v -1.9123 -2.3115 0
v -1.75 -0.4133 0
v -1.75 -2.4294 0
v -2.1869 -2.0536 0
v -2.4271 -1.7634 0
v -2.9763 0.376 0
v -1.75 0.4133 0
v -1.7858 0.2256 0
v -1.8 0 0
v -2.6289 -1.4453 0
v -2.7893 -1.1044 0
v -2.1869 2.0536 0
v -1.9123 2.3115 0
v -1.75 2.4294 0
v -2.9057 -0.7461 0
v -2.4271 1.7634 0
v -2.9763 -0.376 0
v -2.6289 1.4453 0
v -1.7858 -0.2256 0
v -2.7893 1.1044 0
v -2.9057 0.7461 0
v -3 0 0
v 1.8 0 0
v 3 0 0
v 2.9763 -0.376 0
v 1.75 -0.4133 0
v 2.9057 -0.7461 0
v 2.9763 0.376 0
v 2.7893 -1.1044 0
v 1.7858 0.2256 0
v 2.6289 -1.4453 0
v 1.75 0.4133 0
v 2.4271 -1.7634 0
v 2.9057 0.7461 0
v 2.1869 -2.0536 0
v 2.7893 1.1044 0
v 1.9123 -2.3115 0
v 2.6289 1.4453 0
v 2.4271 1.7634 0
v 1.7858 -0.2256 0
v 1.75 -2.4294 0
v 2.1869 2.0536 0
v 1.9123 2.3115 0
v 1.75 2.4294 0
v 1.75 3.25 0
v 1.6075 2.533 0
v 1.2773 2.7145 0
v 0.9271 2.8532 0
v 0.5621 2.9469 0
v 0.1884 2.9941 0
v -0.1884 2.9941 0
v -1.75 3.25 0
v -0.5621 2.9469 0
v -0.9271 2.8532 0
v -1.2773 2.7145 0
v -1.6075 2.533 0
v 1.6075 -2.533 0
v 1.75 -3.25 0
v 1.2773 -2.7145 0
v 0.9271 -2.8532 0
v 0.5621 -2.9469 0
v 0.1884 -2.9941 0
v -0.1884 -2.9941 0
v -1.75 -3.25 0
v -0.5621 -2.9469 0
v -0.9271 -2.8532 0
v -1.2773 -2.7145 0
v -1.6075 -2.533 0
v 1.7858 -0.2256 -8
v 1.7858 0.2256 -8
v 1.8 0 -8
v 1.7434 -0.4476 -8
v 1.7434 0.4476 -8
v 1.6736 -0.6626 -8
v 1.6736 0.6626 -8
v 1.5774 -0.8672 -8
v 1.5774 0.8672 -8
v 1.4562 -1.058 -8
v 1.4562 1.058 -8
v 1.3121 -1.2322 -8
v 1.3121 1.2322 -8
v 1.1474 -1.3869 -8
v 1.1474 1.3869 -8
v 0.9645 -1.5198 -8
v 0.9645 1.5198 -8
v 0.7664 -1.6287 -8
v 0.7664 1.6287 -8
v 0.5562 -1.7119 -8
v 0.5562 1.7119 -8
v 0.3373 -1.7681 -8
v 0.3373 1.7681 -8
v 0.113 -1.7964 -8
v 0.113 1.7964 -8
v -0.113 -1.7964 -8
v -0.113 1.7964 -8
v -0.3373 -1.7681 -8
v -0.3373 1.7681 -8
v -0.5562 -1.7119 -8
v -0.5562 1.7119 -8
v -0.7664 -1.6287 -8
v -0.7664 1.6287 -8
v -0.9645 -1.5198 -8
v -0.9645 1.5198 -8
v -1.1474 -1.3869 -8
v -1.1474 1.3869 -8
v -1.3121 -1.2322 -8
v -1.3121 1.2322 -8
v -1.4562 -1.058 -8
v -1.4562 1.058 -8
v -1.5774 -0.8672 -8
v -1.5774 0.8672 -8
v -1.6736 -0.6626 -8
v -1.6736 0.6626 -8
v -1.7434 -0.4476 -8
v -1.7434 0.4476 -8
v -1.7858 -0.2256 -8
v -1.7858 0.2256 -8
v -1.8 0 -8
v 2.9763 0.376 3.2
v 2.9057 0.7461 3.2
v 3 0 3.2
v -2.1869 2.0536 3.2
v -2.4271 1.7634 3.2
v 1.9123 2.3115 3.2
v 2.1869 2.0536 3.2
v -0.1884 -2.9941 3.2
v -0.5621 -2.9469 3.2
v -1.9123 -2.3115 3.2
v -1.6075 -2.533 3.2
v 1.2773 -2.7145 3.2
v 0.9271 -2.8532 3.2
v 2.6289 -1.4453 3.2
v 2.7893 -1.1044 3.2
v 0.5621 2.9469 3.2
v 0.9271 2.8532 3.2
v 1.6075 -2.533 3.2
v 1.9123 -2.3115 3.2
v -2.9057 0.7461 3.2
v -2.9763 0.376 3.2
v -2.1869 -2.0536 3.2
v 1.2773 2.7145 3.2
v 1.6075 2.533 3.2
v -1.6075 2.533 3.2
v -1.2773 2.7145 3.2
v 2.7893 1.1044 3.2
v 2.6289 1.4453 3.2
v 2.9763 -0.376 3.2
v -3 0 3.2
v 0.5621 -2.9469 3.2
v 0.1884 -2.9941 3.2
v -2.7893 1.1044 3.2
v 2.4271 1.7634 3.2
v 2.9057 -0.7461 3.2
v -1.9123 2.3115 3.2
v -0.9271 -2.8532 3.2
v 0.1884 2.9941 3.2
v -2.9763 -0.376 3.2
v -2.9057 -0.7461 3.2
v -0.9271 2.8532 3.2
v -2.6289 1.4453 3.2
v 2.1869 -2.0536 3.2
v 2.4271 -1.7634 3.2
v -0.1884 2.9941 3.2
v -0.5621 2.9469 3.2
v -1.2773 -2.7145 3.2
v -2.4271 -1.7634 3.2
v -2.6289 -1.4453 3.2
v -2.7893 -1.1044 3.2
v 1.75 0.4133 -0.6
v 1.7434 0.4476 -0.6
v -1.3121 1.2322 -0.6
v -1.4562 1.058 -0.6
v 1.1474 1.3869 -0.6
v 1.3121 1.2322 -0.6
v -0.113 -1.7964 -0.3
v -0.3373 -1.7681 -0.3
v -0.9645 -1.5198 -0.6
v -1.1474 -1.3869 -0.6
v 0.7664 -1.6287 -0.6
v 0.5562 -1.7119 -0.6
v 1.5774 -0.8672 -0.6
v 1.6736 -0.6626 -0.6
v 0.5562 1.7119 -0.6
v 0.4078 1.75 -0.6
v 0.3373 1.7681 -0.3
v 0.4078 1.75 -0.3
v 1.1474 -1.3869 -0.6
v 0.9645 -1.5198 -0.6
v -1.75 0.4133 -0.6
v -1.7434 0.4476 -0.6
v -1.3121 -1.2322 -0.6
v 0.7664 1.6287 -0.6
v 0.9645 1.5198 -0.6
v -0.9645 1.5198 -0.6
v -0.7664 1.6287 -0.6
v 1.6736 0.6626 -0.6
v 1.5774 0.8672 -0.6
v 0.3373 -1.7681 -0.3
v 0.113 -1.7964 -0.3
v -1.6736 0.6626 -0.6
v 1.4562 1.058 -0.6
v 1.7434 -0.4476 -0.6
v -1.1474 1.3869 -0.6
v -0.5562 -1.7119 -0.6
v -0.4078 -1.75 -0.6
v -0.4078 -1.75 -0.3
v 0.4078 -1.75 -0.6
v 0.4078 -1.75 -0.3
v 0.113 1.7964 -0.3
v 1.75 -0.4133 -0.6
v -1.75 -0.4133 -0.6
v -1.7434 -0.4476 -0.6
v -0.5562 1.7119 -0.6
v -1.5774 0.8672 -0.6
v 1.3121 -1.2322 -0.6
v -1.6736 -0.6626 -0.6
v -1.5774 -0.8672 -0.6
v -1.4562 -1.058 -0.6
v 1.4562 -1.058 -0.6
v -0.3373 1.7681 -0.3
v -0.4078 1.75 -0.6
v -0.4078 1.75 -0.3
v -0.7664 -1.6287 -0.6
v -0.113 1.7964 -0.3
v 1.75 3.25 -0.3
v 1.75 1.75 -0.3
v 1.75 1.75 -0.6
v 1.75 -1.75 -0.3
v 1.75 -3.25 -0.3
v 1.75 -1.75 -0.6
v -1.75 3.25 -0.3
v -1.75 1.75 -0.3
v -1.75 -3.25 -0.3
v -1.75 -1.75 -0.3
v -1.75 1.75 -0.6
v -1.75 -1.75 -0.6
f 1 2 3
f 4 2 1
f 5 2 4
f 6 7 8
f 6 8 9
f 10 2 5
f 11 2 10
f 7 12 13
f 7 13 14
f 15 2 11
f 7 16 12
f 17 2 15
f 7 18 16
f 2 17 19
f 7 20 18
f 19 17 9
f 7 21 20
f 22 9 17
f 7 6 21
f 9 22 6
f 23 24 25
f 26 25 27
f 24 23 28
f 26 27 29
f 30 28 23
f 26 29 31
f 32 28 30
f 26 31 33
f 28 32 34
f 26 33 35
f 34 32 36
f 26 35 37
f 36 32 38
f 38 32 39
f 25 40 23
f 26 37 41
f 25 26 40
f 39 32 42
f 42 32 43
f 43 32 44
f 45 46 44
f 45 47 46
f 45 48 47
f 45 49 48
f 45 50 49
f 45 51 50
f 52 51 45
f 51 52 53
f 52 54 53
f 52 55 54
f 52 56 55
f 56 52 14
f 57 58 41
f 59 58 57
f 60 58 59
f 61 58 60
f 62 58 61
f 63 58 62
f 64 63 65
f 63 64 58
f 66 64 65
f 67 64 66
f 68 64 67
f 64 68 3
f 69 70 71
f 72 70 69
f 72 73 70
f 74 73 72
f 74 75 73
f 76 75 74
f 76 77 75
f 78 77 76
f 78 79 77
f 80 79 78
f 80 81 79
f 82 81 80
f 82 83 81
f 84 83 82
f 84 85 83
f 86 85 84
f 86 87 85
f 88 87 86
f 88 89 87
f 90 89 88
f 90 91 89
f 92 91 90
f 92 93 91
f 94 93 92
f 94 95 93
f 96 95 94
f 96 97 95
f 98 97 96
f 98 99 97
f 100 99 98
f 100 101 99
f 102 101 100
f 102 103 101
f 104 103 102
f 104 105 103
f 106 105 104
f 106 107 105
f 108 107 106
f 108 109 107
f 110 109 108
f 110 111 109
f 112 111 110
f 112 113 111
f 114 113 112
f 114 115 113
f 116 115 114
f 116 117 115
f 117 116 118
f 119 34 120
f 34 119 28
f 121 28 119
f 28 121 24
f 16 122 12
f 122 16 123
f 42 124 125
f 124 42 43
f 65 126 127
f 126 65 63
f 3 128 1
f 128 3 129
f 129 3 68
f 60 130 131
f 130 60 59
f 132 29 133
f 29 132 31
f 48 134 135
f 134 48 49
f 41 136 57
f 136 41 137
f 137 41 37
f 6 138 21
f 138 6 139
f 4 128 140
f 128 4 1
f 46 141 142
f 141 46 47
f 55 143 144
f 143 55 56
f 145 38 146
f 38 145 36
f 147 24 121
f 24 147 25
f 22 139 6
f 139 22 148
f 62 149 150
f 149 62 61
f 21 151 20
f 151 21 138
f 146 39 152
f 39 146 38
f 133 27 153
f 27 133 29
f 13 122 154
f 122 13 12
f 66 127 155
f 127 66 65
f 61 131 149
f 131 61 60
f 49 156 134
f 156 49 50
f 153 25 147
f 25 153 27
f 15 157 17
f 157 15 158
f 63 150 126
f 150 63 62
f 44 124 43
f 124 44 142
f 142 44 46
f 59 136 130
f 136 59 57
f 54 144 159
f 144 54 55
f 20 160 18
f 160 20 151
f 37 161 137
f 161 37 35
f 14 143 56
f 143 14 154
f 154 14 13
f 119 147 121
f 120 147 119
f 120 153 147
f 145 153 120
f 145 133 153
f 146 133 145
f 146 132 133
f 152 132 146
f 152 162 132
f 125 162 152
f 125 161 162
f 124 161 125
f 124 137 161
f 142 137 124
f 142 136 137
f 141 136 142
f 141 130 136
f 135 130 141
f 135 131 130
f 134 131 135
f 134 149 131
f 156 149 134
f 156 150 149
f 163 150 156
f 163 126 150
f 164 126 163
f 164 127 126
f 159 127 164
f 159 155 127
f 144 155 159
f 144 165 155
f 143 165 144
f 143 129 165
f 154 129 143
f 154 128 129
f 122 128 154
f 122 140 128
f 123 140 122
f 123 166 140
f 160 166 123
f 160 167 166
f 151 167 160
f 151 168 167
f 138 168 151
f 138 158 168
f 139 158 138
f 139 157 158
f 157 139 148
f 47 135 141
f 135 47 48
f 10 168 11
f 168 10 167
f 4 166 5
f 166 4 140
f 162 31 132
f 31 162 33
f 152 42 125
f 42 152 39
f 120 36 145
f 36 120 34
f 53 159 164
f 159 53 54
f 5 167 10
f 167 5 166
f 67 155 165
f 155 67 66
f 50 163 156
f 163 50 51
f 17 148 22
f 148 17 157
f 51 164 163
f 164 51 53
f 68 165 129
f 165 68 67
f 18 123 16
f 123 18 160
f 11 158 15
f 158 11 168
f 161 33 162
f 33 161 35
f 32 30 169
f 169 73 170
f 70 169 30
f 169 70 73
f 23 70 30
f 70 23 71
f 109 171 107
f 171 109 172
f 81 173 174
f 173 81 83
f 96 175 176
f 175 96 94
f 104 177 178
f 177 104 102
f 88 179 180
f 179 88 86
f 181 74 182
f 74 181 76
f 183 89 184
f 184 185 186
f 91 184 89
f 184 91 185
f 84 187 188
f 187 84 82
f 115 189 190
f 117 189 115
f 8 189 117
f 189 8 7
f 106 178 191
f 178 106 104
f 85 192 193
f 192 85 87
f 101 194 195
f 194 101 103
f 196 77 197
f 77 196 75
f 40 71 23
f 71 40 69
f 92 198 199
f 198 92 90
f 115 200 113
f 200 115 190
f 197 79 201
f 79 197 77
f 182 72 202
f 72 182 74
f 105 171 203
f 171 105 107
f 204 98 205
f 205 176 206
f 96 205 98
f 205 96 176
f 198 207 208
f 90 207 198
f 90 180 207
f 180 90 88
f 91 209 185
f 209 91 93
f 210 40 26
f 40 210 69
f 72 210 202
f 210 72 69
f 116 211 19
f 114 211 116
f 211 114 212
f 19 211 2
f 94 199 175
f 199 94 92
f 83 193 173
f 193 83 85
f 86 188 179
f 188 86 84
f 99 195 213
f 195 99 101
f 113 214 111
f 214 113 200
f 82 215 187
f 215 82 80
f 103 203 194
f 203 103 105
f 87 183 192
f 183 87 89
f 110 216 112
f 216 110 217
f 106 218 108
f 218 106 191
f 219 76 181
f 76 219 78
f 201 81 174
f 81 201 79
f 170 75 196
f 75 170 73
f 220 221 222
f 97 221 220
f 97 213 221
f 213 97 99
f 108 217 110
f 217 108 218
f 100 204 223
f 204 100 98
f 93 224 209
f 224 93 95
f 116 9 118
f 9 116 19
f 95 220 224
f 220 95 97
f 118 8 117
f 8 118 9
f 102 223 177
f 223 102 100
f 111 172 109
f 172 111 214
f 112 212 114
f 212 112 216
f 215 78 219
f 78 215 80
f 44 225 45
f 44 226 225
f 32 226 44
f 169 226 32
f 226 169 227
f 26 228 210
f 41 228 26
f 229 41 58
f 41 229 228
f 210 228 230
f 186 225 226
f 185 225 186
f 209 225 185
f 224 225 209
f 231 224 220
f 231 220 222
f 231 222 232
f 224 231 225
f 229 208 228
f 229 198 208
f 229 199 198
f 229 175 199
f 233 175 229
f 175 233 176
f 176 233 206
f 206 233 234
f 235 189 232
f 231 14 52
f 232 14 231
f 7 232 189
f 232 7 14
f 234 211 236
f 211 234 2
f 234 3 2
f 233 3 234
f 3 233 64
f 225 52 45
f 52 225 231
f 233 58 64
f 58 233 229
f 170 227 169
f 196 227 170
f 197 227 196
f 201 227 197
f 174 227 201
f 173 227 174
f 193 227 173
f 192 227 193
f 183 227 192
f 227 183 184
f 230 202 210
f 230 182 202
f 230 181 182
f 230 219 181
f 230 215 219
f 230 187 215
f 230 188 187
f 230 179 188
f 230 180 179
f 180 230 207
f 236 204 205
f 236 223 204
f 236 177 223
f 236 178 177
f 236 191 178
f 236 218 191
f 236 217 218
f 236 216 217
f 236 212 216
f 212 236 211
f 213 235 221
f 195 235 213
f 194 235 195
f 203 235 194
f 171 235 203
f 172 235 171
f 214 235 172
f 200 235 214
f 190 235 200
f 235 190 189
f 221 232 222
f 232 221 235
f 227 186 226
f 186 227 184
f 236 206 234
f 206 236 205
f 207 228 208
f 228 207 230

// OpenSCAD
$fn = 50;


difference() {
	union() {
		translate(v = [0, 0, 0]) {
			rotate(a = [0, 0, 0]) {
				difference() {
					union() {
						translate(v = [0, 0, -8.0000000000]) {
							cylinder(h = 8, r = 1.5000000000);
						}
						cylinder(h = 3.2000000000, r = 3.0000000000);
						translate(v = [0, 0, -8.0000000000]) {
							cylinder(h = 8, r = 1.8000000000);
						}
						translate(v = [-1.7500000000, -3.2500000000, -0.3000000000]) {
							cube(size = [3.5000000000, 6.5000000000, 0.3000000000]);
						}
						translate(v = [-1.7500000000, -1.7500000000, -0.6000000000]) {
							cube(size = [3.5000000000, 3.5000000000, 0.3000000000]);
						}
						translate(v = [0, 0, -8.0000000000]) {
							cylinder(h = 8, r = 1.5000000000);
						}
					}
					union();
				}
			}
		}
	}
	union();
}
